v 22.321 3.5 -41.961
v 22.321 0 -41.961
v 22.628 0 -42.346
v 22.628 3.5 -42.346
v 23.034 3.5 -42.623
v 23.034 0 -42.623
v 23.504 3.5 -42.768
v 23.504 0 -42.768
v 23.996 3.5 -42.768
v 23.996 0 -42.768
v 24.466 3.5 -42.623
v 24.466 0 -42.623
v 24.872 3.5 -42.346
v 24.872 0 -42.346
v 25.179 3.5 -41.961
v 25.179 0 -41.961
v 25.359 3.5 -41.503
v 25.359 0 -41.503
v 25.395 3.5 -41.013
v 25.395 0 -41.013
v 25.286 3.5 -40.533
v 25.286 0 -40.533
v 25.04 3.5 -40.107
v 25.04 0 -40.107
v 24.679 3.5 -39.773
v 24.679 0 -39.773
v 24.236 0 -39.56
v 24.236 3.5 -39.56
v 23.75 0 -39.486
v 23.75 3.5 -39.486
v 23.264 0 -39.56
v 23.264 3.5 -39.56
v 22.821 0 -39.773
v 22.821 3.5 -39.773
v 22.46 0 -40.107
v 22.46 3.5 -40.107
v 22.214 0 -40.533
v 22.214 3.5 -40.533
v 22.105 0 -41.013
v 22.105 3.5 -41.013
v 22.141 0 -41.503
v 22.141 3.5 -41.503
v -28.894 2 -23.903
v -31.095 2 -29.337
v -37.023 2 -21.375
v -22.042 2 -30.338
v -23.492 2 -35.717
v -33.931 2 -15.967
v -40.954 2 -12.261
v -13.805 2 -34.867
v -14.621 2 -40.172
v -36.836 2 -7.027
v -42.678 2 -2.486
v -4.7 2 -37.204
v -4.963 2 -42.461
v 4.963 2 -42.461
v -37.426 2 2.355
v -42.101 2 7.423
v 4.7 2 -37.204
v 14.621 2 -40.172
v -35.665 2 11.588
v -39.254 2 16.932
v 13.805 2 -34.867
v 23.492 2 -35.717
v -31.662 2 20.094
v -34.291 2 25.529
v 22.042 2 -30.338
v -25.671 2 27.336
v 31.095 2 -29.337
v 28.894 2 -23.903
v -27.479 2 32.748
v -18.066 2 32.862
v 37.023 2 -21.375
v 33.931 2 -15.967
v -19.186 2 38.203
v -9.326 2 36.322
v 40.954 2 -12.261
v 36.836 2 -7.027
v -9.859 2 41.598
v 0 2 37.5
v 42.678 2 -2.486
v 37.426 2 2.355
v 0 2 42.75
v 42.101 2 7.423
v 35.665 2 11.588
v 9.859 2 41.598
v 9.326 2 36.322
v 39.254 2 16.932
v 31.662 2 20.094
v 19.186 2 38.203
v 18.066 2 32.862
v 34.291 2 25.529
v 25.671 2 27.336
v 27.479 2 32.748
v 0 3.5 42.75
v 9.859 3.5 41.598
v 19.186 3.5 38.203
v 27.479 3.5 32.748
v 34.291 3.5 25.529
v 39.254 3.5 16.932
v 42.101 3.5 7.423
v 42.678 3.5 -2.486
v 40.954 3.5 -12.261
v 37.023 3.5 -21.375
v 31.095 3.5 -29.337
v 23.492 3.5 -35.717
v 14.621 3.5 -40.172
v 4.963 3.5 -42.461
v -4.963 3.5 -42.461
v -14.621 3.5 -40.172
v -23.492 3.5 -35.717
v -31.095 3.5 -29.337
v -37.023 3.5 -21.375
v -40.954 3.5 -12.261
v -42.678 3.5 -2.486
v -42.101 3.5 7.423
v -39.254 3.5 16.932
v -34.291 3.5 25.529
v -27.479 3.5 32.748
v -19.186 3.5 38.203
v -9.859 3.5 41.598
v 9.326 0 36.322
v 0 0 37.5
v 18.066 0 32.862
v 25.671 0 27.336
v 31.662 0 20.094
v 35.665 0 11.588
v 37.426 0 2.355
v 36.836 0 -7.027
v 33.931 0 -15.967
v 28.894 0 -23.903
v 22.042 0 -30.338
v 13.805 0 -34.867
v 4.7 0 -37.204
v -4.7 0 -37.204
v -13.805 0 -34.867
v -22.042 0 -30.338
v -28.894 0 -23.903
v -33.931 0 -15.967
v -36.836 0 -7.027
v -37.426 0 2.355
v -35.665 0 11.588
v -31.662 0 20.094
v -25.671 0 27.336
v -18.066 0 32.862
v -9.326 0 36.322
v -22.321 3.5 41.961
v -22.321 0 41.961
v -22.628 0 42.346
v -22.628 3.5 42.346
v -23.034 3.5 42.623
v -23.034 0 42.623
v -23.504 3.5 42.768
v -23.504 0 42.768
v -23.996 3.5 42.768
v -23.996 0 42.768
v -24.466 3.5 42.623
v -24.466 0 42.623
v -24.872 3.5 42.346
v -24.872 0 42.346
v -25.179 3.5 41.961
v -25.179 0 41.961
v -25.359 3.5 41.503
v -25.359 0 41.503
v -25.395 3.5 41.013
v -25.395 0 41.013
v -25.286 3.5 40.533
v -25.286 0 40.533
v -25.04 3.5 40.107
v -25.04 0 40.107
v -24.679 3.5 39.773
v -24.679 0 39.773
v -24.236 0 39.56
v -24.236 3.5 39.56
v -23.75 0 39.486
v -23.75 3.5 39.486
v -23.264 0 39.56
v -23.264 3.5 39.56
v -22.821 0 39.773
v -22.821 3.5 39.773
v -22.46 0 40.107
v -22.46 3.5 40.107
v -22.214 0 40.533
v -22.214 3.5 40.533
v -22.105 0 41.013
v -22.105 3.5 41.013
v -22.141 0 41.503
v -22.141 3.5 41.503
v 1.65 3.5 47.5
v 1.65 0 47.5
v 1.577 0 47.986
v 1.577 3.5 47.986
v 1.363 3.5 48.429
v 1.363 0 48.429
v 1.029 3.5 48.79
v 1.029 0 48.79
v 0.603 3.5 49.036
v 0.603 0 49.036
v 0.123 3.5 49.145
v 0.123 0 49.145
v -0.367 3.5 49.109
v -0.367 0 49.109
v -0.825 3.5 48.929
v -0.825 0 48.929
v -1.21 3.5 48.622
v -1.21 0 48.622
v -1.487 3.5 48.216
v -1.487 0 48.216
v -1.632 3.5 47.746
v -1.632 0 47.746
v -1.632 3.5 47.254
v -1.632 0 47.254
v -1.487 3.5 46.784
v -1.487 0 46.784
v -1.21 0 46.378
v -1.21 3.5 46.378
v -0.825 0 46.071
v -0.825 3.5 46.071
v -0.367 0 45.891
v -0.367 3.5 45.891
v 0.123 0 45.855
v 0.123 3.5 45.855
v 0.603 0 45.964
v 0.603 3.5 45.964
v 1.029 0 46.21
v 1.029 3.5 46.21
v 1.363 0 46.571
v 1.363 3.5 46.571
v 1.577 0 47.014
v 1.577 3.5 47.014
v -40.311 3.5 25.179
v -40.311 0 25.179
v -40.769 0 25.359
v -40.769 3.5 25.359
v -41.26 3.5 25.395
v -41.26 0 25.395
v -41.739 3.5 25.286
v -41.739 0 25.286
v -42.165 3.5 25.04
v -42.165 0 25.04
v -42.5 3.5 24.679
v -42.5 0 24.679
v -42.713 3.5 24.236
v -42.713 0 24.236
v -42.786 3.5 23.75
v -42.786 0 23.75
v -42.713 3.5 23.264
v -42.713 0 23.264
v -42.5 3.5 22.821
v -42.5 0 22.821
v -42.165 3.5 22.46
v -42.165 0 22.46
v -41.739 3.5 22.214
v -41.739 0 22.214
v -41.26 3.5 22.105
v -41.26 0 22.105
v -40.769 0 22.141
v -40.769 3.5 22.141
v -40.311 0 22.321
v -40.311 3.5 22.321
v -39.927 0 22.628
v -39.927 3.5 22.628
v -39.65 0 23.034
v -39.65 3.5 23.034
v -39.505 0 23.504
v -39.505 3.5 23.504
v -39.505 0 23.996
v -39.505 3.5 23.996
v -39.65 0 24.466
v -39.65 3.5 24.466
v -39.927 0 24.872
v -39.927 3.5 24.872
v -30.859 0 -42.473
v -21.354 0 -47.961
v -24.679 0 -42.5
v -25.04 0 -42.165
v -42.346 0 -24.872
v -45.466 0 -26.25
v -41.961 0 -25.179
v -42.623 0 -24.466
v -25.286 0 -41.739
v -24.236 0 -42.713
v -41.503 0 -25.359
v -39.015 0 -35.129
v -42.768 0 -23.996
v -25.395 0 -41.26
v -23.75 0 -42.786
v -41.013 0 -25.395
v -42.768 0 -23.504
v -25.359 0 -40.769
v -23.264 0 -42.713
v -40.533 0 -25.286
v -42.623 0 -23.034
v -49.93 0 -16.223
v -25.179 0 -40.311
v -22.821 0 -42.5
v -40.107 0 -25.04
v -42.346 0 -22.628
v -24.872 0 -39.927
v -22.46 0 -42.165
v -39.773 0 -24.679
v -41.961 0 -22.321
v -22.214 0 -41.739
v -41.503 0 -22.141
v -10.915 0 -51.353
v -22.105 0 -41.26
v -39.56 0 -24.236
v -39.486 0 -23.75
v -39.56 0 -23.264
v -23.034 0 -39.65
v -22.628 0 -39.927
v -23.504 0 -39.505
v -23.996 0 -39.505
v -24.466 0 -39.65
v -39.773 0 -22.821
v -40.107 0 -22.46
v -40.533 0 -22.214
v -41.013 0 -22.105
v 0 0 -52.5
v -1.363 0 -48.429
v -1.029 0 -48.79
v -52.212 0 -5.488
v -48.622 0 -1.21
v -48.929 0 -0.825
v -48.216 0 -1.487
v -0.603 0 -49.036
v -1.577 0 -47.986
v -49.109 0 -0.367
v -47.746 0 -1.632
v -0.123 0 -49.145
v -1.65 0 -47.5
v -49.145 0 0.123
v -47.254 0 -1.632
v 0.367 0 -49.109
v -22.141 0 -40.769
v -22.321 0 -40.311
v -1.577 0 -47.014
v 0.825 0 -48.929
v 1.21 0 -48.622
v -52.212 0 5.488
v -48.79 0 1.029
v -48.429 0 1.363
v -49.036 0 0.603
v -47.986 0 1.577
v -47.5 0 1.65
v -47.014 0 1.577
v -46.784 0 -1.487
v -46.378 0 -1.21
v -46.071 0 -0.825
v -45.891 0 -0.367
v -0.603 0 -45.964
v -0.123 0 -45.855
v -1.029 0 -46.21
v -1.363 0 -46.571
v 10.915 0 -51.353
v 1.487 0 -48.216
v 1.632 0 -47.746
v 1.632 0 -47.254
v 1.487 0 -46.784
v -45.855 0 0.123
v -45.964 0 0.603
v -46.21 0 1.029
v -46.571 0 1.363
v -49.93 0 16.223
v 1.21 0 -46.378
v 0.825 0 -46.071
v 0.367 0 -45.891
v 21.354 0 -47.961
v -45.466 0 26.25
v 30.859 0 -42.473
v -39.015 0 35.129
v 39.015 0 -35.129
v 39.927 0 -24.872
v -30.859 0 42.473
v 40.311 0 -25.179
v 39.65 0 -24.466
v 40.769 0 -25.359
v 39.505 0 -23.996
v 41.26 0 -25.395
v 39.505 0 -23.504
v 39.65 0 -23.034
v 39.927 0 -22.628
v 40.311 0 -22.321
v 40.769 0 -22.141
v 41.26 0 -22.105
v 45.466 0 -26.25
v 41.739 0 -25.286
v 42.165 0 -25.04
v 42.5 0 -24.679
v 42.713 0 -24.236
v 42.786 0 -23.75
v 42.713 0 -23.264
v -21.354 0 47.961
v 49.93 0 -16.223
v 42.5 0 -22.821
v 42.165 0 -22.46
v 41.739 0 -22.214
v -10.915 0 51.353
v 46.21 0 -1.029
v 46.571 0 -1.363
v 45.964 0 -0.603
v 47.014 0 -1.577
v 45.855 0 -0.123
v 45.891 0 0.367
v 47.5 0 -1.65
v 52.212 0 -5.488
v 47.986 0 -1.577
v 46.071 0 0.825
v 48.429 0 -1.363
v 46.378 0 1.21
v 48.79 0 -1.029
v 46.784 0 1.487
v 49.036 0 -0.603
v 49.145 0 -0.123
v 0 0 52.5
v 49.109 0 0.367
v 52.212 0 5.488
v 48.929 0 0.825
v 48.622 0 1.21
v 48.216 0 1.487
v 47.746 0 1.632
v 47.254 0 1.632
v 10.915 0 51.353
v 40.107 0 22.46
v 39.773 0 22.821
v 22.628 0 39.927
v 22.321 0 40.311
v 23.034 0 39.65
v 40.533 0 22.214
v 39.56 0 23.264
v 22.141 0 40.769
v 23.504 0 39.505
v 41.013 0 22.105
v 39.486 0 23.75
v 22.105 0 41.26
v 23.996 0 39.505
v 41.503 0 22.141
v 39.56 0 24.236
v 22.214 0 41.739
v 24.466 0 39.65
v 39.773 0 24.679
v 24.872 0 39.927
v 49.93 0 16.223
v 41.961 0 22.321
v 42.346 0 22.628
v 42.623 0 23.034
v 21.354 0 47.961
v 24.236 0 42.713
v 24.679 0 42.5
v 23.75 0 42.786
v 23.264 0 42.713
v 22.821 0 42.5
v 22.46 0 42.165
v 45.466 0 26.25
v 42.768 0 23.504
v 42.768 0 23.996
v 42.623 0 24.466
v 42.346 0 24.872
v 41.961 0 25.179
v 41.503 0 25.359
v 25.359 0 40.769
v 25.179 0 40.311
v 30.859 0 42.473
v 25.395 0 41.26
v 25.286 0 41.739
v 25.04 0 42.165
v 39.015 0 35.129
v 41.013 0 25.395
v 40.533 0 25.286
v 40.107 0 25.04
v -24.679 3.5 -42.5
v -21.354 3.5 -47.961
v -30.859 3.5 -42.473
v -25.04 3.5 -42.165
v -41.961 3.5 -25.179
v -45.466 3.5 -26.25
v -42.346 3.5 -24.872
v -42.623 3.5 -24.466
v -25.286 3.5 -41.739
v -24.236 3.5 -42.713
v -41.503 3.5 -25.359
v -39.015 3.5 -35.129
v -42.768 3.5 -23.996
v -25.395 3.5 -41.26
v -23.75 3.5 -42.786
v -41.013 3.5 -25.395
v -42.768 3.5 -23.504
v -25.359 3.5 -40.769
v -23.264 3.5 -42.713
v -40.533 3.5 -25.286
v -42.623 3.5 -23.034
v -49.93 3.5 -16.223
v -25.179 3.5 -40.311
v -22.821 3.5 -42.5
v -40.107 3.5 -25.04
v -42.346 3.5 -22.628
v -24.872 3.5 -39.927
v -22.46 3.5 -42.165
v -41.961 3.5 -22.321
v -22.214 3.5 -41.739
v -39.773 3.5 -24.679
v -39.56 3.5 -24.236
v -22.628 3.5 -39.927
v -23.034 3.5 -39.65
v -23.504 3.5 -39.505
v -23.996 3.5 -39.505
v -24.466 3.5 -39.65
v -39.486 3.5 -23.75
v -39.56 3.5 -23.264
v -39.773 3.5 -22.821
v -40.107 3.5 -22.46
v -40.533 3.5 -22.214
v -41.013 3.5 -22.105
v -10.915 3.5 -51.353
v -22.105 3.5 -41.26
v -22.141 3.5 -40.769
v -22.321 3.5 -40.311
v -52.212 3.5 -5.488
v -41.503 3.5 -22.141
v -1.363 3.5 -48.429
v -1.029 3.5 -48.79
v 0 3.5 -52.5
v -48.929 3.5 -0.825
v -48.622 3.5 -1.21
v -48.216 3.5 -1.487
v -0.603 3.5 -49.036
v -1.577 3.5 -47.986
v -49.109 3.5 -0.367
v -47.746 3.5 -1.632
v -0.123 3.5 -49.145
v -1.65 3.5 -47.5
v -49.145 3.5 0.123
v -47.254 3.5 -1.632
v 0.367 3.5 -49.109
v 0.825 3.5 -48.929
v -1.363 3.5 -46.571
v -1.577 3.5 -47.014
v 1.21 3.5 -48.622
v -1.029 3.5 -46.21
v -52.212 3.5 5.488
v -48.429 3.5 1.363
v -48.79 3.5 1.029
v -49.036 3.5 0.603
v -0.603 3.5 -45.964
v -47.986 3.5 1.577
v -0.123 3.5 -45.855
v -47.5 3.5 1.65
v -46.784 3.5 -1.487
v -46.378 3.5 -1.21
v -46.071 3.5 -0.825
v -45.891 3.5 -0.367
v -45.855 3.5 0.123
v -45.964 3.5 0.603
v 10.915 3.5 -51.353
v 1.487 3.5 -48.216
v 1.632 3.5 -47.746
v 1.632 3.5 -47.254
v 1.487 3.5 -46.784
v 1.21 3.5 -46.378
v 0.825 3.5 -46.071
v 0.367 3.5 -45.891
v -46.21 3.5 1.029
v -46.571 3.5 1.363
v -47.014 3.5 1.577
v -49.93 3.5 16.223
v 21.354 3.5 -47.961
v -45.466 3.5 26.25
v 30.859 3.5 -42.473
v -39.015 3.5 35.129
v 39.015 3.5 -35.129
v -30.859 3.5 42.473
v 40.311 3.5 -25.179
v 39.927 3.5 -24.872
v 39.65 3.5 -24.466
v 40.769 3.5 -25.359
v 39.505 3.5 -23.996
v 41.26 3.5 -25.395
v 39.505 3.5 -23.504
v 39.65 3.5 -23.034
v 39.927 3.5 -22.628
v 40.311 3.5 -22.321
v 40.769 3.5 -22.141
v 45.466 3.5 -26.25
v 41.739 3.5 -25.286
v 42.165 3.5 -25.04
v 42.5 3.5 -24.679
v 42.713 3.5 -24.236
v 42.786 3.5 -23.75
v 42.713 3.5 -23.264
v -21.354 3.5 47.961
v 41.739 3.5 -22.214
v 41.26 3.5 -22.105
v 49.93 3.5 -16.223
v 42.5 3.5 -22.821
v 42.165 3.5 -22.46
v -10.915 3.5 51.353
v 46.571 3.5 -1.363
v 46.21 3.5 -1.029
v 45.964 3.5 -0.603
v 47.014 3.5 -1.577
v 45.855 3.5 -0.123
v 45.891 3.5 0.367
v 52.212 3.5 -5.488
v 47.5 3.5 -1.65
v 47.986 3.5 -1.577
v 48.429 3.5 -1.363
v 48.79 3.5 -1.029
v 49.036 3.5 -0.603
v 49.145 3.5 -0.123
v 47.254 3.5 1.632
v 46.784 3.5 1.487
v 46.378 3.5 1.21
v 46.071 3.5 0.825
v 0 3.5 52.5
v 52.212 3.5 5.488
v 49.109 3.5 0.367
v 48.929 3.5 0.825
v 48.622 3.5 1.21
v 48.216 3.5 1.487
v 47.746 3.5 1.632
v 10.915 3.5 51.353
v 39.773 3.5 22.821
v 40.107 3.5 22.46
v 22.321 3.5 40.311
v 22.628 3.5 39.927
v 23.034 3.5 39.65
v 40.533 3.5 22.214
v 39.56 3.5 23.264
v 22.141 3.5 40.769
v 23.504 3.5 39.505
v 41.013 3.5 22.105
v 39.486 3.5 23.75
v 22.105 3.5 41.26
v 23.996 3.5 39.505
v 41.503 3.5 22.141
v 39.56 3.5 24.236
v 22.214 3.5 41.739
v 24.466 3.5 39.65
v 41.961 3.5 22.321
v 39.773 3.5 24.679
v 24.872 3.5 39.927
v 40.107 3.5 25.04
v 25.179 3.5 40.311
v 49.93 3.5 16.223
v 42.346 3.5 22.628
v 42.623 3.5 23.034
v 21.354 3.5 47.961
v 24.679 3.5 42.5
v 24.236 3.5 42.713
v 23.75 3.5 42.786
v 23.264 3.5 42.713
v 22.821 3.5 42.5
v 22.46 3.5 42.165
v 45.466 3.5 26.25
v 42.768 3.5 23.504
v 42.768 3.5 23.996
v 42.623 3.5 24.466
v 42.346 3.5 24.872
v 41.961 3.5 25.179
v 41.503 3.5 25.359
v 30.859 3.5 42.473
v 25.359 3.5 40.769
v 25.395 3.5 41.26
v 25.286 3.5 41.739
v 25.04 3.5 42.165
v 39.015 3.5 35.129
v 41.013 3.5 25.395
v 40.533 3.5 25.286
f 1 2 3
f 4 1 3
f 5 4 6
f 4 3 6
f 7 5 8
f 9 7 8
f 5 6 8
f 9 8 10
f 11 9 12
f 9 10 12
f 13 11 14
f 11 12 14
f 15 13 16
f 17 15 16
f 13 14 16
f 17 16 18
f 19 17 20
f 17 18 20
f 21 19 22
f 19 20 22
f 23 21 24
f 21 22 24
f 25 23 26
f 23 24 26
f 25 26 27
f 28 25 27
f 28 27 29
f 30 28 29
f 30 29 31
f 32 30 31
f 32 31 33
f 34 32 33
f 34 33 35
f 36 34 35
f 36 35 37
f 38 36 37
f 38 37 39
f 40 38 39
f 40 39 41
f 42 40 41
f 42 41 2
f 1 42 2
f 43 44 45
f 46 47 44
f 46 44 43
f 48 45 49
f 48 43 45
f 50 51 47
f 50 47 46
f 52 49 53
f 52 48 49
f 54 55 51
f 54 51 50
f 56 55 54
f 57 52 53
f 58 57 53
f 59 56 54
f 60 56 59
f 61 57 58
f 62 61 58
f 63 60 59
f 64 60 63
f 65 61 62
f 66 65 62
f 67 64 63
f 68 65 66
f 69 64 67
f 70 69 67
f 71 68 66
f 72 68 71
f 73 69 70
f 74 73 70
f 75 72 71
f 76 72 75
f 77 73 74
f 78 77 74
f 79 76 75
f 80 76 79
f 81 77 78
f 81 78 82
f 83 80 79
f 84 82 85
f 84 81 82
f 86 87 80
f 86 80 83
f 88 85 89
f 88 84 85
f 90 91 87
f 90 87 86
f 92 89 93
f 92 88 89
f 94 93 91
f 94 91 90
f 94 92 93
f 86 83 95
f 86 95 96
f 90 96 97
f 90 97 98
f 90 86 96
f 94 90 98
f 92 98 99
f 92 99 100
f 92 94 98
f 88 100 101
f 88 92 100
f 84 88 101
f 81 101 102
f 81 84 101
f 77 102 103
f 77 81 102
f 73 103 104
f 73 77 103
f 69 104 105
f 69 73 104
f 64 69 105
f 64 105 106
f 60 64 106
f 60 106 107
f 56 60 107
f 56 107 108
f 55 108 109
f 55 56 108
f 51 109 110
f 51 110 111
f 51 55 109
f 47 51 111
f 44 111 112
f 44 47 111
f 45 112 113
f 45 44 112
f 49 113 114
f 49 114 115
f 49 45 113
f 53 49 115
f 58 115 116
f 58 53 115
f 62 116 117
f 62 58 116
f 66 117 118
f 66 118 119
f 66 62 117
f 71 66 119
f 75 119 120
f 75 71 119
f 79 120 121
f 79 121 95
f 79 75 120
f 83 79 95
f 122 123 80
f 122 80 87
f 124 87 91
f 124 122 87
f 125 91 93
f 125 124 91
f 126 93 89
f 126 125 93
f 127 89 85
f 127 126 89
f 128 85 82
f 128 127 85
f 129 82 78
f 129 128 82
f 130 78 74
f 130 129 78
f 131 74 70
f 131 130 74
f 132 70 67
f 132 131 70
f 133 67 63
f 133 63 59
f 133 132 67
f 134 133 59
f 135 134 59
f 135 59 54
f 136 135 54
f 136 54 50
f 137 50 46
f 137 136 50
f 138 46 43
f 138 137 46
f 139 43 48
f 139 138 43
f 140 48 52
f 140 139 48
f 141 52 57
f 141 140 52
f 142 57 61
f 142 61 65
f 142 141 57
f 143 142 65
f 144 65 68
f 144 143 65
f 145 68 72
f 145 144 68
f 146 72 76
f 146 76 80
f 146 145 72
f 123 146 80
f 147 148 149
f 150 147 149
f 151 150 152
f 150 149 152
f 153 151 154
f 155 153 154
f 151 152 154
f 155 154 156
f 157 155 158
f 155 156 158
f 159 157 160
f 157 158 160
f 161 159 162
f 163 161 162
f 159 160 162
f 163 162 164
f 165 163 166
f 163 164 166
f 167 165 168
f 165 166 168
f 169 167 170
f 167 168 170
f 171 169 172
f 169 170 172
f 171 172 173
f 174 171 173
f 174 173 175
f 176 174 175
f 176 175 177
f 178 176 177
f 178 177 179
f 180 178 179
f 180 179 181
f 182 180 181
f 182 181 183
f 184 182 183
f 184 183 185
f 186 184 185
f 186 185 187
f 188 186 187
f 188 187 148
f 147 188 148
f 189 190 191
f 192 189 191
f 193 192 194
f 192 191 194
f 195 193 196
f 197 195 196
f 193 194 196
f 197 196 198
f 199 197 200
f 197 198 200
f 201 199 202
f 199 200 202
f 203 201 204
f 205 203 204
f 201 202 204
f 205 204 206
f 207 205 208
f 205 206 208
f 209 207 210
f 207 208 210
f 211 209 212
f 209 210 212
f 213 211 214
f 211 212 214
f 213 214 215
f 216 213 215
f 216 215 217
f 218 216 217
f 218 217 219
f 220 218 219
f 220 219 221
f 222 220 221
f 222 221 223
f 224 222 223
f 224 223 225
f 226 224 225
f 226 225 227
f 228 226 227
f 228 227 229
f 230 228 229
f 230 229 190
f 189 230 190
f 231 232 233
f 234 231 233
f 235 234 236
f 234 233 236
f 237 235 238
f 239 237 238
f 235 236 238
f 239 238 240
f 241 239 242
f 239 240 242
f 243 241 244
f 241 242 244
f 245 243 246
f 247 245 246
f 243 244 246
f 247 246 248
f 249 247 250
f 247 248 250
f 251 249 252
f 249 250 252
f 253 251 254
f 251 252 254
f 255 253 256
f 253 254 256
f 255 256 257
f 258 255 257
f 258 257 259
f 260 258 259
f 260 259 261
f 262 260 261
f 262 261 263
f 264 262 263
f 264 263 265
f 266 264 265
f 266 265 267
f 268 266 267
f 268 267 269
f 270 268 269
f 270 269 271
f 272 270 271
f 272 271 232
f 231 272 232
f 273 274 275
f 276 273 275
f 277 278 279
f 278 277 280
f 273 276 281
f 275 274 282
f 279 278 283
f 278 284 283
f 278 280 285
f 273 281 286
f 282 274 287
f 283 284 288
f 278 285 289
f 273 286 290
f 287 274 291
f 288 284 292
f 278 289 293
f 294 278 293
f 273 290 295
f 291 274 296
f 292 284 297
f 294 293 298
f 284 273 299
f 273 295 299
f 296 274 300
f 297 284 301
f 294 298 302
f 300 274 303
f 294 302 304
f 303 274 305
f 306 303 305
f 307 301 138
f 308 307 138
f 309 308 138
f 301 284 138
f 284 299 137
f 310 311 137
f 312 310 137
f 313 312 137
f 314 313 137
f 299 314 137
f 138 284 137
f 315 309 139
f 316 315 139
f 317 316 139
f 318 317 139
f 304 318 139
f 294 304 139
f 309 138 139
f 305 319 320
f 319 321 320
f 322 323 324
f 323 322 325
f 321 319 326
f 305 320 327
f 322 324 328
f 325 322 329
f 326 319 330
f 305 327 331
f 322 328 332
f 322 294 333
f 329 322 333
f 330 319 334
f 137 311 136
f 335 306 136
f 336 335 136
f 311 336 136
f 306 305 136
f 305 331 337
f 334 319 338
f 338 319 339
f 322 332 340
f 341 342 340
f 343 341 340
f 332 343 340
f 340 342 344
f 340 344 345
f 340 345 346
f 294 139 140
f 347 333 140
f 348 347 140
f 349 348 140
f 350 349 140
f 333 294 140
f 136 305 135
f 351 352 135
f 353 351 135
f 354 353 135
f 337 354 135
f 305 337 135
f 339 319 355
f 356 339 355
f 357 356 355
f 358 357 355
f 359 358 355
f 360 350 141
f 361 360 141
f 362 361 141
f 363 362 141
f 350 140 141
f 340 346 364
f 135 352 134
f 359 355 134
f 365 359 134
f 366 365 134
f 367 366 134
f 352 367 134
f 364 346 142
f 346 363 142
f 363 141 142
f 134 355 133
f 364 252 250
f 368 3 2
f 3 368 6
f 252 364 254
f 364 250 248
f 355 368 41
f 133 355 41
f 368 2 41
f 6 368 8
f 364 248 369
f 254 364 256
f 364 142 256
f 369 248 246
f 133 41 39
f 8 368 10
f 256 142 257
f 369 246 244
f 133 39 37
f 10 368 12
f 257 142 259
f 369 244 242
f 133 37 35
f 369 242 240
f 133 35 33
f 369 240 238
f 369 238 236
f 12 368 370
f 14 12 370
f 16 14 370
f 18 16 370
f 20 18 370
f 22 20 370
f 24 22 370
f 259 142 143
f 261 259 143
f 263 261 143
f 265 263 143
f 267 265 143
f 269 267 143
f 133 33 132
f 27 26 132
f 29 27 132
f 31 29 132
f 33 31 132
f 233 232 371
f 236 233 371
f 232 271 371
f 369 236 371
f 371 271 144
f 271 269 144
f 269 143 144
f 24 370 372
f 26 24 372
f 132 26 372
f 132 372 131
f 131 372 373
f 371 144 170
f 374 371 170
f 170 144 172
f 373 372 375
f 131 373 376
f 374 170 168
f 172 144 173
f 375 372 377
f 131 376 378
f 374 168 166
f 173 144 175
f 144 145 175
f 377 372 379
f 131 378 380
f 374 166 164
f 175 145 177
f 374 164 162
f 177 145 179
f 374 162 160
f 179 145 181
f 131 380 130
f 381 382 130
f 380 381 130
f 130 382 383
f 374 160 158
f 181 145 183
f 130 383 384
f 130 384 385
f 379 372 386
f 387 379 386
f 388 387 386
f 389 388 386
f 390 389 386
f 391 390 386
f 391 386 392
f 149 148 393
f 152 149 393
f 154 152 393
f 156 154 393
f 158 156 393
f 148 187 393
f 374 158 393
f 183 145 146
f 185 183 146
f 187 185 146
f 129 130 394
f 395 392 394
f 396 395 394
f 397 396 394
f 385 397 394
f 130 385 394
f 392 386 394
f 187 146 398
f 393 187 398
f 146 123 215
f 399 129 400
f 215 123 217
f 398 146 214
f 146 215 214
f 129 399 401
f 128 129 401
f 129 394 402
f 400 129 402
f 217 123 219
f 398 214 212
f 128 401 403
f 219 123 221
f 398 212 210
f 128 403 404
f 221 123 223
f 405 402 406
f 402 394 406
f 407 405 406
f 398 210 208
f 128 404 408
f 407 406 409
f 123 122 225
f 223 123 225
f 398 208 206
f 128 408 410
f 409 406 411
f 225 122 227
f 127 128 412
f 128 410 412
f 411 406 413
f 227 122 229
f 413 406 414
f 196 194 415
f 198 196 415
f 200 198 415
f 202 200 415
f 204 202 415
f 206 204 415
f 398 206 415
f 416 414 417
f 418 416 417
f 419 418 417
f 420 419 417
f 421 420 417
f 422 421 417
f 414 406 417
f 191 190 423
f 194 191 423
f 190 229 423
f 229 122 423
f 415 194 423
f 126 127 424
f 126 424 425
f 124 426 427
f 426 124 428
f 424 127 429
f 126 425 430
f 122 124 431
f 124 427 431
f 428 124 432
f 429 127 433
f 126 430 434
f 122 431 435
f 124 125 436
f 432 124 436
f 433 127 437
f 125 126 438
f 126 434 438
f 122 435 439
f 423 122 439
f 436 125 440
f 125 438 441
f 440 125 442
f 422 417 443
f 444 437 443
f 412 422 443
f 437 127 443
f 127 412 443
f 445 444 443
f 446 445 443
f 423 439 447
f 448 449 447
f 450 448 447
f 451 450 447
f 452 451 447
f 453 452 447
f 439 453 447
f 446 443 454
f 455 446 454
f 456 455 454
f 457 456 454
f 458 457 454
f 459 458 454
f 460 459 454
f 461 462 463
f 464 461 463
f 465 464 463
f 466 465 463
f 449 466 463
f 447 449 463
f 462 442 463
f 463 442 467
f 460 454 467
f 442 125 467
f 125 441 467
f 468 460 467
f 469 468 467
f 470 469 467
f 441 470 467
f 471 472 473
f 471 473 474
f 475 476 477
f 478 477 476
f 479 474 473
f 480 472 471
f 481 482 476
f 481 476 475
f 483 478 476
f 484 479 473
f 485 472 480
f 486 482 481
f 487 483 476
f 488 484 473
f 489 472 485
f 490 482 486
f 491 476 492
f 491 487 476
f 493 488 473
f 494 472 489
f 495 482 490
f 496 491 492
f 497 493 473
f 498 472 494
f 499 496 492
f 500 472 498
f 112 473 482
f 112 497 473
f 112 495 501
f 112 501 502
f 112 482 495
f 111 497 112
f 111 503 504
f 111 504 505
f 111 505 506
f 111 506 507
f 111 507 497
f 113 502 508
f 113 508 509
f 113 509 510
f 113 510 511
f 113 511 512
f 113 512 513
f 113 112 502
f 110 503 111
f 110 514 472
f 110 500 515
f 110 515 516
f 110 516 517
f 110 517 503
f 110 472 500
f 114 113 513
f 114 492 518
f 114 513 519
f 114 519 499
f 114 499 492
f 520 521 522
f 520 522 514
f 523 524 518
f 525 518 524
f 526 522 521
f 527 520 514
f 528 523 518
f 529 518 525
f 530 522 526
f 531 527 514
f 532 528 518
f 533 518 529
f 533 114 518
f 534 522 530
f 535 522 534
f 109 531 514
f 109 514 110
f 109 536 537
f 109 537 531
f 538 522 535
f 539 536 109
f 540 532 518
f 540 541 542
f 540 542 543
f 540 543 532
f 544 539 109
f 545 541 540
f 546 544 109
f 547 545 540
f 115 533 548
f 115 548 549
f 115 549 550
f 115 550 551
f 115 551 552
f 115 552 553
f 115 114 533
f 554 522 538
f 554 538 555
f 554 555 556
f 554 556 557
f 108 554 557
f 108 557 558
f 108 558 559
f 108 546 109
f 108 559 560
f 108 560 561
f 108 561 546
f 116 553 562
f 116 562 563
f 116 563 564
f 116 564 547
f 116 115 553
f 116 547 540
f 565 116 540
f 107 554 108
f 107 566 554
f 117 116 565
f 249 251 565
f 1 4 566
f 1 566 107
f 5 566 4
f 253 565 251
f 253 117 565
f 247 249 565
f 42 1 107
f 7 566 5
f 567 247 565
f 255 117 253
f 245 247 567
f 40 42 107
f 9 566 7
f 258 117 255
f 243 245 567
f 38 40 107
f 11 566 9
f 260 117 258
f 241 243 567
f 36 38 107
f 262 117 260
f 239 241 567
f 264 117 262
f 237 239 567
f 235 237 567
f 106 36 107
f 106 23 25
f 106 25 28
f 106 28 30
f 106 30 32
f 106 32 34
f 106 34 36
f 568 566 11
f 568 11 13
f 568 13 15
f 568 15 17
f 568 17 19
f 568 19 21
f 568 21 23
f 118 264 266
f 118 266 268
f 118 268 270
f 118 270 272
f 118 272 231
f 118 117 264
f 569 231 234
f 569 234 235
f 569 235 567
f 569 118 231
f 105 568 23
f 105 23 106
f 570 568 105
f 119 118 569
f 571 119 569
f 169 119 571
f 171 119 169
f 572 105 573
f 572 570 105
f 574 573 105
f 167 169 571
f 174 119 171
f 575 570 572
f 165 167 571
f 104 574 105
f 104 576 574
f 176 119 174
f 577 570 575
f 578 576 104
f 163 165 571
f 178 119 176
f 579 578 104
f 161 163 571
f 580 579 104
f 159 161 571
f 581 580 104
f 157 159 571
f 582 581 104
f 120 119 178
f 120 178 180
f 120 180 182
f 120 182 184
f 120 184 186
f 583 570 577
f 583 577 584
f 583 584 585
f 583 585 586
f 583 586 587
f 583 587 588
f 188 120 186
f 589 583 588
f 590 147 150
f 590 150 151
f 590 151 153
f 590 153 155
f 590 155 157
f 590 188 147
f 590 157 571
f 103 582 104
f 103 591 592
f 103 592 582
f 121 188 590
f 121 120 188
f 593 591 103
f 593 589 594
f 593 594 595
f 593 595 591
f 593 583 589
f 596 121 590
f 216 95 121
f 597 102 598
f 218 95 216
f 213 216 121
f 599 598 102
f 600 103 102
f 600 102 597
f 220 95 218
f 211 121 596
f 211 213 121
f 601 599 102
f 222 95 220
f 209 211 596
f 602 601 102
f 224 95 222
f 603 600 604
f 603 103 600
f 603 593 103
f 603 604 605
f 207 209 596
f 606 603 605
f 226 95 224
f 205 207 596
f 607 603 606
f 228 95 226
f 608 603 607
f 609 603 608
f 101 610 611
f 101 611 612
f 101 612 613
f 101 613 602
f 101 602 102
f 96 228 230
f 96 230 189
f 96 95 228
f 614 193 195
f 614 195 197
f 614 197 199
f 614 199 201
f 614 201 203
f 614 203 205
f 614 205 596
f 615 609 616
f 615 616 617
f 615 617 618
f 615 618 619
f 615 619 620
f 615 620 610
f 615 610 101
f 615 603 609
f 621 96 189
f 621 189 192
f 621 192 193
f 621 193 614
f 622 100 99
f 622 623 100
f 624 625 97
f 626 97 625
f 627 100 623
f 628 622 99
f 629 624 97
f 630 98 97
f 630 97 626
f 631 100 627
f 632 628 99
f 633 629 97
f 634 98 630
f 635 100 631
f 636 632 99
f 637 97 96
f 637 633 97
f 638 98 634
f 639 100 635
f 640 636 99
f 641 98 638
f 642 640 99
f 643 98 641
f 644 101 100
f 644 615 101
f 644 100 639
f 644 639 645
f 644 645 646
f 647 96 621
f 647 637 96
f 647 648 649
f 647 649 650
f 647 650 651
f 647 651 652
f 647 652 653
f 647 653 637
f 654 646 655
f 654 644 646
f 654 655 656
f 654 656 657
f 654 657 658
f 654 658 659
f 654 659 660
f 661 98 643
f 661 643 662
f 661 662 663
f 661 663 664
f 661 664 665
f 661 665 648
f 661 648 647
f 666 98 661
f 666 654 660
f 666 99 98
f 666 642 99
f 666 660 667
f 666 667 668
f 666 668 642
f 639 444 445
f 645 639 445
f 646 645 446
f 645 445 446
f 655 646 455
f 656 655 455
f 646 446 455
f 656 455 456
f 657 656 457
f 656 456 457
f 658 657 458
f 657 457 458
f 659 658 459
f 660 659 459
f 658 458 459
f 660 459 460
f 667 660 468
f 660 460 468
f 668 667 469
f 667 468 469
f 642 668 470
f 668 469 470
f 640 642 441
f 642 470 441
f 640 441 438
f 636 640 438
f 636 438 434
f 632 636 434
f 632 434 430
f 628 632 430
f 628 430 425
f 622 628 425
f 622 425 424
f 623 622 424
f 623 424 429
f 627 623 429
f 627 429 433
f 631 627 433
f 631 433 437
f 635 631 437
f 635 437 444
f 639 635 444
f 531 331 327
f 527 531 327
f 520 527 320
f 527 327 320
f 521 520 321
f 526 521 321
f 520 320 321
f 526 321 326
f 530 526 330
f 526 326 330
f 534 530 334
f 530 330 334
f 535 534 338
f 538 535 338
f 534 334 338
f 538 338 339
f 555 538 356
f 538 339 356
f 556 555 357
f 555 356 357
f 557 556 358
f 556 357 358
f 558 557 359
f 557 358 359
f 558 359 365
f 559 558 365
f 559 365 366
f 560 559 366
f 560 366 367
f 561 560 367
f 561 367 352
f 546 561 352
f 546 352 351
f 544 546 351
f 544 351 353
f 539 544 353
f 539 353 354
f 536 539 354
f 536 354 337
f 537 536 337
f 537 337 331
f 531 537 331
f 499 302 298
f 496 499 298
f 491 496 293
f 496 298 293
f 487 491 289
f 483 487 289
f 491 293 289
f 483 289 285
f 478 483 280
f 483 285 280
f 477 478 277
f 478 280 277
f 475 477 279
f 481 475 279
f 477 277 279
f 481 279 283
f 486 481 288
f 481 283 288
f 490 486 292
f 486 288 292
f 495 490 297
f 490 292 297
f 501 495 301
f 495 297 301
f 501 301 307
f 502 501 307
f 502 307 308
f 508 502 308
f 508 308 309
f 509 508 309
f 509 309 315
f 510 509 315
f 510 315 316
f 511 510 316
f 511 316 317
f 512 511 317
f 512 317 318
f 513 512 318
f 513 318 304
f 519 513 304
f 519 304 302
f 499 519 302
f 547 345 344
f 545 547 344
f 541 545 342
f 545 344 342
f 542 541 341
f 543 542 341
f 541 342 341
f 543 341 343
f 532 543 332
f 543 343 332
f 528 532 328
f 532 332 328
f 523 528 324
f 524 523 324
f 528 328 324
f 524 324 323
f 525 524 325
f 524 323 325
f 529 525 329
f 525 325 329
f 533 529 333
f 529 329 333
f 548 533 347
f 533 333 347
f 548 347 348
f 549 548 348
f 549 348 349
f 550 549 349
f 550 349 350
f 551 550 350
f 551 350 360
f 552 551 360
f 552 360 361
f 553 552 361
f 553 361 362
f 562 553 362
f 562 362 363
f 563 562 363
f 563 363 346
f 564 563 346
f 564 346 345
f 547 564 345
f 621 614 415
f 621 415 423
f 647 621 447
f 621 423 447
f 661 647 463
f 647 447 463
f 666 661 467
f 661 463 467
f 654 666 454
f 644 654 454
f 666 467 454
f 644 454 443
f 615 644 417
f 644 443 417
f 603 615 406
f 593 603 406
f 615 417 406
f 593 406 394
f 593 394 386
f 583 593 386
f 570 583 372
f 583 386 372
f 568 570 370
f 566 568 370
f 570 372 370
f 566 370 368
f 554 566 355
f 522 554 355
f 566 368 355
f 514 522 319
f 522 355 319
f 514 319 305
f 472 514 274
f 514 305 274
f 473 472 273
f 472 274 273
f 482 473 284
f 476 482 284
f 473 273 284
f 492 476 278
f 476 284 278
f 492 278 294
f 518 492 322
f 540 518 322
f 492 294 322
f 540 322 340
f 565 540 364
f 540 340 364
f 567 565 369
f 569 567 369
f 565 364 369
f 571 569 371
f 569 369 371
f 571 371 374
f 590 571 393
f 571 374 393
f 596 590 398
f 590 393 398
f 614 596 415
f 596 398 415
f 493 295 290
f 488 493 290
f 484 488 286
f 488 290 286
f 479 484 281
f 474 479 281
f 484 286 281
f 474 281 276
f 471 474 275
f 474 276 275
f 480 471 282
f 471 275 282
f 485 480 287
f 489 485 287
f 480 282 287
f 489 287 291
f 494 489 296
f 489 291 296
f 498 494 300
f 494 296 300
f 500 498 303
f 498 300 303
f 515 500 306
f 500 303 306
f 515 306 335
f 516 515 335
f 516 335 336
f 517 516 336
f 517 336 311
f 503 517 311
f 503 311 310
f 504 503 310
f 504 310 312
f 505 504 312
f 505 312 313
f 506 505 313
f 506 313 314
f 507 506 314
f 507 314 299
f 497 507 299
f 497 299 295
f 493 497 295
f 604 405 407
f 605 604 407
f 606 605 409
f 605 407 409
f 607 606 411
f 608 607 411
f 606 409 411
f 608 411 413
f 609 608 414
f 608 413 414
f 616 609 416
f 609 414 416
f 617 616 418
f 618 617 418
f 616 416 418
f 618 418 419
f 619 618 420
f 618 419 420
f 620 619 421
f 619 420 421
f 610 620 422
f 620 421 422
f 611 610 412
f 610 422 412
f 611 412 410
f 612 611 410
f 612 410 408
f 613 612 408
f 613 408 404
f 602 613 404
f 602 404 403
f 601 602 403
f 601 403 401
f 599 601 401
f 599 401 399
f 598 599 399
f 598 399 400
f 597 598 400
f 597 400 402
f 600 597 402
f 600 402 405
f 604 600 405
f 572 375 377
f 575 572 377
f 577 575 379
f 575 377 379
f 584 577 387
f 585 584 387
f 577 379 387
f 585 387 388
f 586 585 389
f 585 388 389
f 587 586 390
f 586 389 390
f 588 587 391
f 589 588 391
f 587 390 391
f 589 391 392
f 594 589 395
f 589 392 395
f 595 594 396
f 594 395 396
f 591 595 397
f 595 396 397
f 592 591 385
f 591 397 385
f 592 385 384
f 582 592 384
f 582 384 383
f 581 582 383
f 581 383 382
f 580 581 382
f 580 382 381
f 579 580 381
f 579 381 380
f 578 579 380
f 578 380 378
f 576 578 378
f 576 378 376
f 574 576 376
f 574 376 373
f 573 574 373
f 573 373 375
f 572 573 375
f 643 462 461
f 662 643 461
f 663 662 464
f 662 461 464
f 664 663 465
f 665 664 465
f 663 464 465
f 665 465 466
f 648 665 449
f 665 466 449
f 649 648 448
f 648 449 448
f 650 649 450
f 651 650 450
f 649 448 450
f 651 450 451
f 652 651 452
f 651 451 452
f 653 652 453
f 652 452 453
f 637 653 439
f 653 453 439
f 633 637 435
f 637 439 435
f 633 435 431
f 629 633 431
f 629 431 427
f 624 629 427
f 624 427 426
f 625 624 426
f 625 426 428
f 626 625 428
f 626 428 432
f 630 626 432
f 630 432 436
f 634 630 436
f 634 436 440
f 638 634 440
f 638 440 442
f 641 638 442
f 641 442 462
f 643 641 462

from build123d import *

# Parameters (mm, degrees)
SKETCH1_R           = 52.5
SKETCH1_R_2         = 37.5
BOSS_EXTRUDE1_DEPTH = 2
SKETCH2_R           = 52.5
SKETCH2_R_2         = 42.75
BOSS_EXTRUDE2_DEPTH = 1.5
SKETCH3_R           = 1.65
CUT_EXTRUDE1_DEPTH  = 75.328662036
CIRPATTERN1_COUNT   = 12


with BuildPart() as part:
    # Sketch1 → Boss-Extrude1 (new body)
    with BuildSketch(Plane(origin=(0, 0, 0), x_dir=(1, 0, 0), z_dir=(0, 1, 0))):
        with Locations(Location((0, 0, 0), (0, 0, 270))):
            Circle(SKETCH1_R)
        with Locations(Location((0, 0, 0), (0, 0, 270))):
            Circle(SKETCH1_R_2, mode=Mode.SUBTRACT)
    extrude(amount=BOSS_EXTRUDE1_DEPTH)

    # Sketch2 → Boss-Extrude2 (add)
    with BuildSketch(Plane(origin=(0, 2, 0), x_dir=(1, 0, 0), z_dir=(0, 1, 0))):
        with Locations(Location((0, 0, 0), (0, 0, 270))):
            Circle(SKETCH2_R)
        with Locations(Location((0, 0, 0), (0, 0, 270))):
            Circle(SKETCH2_R_2, mode=Mode.SUBTRACT)
    extrude(amount=BOSS_EXTRUDE2_DEPTH)

    # Sketch3 → Cut-Extrude1 (cut, through all)
    with BuildSketch(Plane.XZ):
        with Locations(Location((47.5, 0, 0), (0, 0, 270))):
            Circle(SKETCH3_R)
    cut_extrude1 = extrude(amount=-CUT_EXTRUDE1_DEPTH, mode=Mode.SUBTRACT)

    # CirPattern1: Cut-Extrude1 ×12 about axis
    cirpattern1_axis = Axis((0, 0, 0), (0, 1, 0))
    for i in range(1, CIRPATTERN1_COUNT):
        add(cut_extrude1.rotate(cirpattern1_axis, i * 360 / CIRPATTERN1_COUNT), mode=Mode.SUBTRACT)


solid = part.part
